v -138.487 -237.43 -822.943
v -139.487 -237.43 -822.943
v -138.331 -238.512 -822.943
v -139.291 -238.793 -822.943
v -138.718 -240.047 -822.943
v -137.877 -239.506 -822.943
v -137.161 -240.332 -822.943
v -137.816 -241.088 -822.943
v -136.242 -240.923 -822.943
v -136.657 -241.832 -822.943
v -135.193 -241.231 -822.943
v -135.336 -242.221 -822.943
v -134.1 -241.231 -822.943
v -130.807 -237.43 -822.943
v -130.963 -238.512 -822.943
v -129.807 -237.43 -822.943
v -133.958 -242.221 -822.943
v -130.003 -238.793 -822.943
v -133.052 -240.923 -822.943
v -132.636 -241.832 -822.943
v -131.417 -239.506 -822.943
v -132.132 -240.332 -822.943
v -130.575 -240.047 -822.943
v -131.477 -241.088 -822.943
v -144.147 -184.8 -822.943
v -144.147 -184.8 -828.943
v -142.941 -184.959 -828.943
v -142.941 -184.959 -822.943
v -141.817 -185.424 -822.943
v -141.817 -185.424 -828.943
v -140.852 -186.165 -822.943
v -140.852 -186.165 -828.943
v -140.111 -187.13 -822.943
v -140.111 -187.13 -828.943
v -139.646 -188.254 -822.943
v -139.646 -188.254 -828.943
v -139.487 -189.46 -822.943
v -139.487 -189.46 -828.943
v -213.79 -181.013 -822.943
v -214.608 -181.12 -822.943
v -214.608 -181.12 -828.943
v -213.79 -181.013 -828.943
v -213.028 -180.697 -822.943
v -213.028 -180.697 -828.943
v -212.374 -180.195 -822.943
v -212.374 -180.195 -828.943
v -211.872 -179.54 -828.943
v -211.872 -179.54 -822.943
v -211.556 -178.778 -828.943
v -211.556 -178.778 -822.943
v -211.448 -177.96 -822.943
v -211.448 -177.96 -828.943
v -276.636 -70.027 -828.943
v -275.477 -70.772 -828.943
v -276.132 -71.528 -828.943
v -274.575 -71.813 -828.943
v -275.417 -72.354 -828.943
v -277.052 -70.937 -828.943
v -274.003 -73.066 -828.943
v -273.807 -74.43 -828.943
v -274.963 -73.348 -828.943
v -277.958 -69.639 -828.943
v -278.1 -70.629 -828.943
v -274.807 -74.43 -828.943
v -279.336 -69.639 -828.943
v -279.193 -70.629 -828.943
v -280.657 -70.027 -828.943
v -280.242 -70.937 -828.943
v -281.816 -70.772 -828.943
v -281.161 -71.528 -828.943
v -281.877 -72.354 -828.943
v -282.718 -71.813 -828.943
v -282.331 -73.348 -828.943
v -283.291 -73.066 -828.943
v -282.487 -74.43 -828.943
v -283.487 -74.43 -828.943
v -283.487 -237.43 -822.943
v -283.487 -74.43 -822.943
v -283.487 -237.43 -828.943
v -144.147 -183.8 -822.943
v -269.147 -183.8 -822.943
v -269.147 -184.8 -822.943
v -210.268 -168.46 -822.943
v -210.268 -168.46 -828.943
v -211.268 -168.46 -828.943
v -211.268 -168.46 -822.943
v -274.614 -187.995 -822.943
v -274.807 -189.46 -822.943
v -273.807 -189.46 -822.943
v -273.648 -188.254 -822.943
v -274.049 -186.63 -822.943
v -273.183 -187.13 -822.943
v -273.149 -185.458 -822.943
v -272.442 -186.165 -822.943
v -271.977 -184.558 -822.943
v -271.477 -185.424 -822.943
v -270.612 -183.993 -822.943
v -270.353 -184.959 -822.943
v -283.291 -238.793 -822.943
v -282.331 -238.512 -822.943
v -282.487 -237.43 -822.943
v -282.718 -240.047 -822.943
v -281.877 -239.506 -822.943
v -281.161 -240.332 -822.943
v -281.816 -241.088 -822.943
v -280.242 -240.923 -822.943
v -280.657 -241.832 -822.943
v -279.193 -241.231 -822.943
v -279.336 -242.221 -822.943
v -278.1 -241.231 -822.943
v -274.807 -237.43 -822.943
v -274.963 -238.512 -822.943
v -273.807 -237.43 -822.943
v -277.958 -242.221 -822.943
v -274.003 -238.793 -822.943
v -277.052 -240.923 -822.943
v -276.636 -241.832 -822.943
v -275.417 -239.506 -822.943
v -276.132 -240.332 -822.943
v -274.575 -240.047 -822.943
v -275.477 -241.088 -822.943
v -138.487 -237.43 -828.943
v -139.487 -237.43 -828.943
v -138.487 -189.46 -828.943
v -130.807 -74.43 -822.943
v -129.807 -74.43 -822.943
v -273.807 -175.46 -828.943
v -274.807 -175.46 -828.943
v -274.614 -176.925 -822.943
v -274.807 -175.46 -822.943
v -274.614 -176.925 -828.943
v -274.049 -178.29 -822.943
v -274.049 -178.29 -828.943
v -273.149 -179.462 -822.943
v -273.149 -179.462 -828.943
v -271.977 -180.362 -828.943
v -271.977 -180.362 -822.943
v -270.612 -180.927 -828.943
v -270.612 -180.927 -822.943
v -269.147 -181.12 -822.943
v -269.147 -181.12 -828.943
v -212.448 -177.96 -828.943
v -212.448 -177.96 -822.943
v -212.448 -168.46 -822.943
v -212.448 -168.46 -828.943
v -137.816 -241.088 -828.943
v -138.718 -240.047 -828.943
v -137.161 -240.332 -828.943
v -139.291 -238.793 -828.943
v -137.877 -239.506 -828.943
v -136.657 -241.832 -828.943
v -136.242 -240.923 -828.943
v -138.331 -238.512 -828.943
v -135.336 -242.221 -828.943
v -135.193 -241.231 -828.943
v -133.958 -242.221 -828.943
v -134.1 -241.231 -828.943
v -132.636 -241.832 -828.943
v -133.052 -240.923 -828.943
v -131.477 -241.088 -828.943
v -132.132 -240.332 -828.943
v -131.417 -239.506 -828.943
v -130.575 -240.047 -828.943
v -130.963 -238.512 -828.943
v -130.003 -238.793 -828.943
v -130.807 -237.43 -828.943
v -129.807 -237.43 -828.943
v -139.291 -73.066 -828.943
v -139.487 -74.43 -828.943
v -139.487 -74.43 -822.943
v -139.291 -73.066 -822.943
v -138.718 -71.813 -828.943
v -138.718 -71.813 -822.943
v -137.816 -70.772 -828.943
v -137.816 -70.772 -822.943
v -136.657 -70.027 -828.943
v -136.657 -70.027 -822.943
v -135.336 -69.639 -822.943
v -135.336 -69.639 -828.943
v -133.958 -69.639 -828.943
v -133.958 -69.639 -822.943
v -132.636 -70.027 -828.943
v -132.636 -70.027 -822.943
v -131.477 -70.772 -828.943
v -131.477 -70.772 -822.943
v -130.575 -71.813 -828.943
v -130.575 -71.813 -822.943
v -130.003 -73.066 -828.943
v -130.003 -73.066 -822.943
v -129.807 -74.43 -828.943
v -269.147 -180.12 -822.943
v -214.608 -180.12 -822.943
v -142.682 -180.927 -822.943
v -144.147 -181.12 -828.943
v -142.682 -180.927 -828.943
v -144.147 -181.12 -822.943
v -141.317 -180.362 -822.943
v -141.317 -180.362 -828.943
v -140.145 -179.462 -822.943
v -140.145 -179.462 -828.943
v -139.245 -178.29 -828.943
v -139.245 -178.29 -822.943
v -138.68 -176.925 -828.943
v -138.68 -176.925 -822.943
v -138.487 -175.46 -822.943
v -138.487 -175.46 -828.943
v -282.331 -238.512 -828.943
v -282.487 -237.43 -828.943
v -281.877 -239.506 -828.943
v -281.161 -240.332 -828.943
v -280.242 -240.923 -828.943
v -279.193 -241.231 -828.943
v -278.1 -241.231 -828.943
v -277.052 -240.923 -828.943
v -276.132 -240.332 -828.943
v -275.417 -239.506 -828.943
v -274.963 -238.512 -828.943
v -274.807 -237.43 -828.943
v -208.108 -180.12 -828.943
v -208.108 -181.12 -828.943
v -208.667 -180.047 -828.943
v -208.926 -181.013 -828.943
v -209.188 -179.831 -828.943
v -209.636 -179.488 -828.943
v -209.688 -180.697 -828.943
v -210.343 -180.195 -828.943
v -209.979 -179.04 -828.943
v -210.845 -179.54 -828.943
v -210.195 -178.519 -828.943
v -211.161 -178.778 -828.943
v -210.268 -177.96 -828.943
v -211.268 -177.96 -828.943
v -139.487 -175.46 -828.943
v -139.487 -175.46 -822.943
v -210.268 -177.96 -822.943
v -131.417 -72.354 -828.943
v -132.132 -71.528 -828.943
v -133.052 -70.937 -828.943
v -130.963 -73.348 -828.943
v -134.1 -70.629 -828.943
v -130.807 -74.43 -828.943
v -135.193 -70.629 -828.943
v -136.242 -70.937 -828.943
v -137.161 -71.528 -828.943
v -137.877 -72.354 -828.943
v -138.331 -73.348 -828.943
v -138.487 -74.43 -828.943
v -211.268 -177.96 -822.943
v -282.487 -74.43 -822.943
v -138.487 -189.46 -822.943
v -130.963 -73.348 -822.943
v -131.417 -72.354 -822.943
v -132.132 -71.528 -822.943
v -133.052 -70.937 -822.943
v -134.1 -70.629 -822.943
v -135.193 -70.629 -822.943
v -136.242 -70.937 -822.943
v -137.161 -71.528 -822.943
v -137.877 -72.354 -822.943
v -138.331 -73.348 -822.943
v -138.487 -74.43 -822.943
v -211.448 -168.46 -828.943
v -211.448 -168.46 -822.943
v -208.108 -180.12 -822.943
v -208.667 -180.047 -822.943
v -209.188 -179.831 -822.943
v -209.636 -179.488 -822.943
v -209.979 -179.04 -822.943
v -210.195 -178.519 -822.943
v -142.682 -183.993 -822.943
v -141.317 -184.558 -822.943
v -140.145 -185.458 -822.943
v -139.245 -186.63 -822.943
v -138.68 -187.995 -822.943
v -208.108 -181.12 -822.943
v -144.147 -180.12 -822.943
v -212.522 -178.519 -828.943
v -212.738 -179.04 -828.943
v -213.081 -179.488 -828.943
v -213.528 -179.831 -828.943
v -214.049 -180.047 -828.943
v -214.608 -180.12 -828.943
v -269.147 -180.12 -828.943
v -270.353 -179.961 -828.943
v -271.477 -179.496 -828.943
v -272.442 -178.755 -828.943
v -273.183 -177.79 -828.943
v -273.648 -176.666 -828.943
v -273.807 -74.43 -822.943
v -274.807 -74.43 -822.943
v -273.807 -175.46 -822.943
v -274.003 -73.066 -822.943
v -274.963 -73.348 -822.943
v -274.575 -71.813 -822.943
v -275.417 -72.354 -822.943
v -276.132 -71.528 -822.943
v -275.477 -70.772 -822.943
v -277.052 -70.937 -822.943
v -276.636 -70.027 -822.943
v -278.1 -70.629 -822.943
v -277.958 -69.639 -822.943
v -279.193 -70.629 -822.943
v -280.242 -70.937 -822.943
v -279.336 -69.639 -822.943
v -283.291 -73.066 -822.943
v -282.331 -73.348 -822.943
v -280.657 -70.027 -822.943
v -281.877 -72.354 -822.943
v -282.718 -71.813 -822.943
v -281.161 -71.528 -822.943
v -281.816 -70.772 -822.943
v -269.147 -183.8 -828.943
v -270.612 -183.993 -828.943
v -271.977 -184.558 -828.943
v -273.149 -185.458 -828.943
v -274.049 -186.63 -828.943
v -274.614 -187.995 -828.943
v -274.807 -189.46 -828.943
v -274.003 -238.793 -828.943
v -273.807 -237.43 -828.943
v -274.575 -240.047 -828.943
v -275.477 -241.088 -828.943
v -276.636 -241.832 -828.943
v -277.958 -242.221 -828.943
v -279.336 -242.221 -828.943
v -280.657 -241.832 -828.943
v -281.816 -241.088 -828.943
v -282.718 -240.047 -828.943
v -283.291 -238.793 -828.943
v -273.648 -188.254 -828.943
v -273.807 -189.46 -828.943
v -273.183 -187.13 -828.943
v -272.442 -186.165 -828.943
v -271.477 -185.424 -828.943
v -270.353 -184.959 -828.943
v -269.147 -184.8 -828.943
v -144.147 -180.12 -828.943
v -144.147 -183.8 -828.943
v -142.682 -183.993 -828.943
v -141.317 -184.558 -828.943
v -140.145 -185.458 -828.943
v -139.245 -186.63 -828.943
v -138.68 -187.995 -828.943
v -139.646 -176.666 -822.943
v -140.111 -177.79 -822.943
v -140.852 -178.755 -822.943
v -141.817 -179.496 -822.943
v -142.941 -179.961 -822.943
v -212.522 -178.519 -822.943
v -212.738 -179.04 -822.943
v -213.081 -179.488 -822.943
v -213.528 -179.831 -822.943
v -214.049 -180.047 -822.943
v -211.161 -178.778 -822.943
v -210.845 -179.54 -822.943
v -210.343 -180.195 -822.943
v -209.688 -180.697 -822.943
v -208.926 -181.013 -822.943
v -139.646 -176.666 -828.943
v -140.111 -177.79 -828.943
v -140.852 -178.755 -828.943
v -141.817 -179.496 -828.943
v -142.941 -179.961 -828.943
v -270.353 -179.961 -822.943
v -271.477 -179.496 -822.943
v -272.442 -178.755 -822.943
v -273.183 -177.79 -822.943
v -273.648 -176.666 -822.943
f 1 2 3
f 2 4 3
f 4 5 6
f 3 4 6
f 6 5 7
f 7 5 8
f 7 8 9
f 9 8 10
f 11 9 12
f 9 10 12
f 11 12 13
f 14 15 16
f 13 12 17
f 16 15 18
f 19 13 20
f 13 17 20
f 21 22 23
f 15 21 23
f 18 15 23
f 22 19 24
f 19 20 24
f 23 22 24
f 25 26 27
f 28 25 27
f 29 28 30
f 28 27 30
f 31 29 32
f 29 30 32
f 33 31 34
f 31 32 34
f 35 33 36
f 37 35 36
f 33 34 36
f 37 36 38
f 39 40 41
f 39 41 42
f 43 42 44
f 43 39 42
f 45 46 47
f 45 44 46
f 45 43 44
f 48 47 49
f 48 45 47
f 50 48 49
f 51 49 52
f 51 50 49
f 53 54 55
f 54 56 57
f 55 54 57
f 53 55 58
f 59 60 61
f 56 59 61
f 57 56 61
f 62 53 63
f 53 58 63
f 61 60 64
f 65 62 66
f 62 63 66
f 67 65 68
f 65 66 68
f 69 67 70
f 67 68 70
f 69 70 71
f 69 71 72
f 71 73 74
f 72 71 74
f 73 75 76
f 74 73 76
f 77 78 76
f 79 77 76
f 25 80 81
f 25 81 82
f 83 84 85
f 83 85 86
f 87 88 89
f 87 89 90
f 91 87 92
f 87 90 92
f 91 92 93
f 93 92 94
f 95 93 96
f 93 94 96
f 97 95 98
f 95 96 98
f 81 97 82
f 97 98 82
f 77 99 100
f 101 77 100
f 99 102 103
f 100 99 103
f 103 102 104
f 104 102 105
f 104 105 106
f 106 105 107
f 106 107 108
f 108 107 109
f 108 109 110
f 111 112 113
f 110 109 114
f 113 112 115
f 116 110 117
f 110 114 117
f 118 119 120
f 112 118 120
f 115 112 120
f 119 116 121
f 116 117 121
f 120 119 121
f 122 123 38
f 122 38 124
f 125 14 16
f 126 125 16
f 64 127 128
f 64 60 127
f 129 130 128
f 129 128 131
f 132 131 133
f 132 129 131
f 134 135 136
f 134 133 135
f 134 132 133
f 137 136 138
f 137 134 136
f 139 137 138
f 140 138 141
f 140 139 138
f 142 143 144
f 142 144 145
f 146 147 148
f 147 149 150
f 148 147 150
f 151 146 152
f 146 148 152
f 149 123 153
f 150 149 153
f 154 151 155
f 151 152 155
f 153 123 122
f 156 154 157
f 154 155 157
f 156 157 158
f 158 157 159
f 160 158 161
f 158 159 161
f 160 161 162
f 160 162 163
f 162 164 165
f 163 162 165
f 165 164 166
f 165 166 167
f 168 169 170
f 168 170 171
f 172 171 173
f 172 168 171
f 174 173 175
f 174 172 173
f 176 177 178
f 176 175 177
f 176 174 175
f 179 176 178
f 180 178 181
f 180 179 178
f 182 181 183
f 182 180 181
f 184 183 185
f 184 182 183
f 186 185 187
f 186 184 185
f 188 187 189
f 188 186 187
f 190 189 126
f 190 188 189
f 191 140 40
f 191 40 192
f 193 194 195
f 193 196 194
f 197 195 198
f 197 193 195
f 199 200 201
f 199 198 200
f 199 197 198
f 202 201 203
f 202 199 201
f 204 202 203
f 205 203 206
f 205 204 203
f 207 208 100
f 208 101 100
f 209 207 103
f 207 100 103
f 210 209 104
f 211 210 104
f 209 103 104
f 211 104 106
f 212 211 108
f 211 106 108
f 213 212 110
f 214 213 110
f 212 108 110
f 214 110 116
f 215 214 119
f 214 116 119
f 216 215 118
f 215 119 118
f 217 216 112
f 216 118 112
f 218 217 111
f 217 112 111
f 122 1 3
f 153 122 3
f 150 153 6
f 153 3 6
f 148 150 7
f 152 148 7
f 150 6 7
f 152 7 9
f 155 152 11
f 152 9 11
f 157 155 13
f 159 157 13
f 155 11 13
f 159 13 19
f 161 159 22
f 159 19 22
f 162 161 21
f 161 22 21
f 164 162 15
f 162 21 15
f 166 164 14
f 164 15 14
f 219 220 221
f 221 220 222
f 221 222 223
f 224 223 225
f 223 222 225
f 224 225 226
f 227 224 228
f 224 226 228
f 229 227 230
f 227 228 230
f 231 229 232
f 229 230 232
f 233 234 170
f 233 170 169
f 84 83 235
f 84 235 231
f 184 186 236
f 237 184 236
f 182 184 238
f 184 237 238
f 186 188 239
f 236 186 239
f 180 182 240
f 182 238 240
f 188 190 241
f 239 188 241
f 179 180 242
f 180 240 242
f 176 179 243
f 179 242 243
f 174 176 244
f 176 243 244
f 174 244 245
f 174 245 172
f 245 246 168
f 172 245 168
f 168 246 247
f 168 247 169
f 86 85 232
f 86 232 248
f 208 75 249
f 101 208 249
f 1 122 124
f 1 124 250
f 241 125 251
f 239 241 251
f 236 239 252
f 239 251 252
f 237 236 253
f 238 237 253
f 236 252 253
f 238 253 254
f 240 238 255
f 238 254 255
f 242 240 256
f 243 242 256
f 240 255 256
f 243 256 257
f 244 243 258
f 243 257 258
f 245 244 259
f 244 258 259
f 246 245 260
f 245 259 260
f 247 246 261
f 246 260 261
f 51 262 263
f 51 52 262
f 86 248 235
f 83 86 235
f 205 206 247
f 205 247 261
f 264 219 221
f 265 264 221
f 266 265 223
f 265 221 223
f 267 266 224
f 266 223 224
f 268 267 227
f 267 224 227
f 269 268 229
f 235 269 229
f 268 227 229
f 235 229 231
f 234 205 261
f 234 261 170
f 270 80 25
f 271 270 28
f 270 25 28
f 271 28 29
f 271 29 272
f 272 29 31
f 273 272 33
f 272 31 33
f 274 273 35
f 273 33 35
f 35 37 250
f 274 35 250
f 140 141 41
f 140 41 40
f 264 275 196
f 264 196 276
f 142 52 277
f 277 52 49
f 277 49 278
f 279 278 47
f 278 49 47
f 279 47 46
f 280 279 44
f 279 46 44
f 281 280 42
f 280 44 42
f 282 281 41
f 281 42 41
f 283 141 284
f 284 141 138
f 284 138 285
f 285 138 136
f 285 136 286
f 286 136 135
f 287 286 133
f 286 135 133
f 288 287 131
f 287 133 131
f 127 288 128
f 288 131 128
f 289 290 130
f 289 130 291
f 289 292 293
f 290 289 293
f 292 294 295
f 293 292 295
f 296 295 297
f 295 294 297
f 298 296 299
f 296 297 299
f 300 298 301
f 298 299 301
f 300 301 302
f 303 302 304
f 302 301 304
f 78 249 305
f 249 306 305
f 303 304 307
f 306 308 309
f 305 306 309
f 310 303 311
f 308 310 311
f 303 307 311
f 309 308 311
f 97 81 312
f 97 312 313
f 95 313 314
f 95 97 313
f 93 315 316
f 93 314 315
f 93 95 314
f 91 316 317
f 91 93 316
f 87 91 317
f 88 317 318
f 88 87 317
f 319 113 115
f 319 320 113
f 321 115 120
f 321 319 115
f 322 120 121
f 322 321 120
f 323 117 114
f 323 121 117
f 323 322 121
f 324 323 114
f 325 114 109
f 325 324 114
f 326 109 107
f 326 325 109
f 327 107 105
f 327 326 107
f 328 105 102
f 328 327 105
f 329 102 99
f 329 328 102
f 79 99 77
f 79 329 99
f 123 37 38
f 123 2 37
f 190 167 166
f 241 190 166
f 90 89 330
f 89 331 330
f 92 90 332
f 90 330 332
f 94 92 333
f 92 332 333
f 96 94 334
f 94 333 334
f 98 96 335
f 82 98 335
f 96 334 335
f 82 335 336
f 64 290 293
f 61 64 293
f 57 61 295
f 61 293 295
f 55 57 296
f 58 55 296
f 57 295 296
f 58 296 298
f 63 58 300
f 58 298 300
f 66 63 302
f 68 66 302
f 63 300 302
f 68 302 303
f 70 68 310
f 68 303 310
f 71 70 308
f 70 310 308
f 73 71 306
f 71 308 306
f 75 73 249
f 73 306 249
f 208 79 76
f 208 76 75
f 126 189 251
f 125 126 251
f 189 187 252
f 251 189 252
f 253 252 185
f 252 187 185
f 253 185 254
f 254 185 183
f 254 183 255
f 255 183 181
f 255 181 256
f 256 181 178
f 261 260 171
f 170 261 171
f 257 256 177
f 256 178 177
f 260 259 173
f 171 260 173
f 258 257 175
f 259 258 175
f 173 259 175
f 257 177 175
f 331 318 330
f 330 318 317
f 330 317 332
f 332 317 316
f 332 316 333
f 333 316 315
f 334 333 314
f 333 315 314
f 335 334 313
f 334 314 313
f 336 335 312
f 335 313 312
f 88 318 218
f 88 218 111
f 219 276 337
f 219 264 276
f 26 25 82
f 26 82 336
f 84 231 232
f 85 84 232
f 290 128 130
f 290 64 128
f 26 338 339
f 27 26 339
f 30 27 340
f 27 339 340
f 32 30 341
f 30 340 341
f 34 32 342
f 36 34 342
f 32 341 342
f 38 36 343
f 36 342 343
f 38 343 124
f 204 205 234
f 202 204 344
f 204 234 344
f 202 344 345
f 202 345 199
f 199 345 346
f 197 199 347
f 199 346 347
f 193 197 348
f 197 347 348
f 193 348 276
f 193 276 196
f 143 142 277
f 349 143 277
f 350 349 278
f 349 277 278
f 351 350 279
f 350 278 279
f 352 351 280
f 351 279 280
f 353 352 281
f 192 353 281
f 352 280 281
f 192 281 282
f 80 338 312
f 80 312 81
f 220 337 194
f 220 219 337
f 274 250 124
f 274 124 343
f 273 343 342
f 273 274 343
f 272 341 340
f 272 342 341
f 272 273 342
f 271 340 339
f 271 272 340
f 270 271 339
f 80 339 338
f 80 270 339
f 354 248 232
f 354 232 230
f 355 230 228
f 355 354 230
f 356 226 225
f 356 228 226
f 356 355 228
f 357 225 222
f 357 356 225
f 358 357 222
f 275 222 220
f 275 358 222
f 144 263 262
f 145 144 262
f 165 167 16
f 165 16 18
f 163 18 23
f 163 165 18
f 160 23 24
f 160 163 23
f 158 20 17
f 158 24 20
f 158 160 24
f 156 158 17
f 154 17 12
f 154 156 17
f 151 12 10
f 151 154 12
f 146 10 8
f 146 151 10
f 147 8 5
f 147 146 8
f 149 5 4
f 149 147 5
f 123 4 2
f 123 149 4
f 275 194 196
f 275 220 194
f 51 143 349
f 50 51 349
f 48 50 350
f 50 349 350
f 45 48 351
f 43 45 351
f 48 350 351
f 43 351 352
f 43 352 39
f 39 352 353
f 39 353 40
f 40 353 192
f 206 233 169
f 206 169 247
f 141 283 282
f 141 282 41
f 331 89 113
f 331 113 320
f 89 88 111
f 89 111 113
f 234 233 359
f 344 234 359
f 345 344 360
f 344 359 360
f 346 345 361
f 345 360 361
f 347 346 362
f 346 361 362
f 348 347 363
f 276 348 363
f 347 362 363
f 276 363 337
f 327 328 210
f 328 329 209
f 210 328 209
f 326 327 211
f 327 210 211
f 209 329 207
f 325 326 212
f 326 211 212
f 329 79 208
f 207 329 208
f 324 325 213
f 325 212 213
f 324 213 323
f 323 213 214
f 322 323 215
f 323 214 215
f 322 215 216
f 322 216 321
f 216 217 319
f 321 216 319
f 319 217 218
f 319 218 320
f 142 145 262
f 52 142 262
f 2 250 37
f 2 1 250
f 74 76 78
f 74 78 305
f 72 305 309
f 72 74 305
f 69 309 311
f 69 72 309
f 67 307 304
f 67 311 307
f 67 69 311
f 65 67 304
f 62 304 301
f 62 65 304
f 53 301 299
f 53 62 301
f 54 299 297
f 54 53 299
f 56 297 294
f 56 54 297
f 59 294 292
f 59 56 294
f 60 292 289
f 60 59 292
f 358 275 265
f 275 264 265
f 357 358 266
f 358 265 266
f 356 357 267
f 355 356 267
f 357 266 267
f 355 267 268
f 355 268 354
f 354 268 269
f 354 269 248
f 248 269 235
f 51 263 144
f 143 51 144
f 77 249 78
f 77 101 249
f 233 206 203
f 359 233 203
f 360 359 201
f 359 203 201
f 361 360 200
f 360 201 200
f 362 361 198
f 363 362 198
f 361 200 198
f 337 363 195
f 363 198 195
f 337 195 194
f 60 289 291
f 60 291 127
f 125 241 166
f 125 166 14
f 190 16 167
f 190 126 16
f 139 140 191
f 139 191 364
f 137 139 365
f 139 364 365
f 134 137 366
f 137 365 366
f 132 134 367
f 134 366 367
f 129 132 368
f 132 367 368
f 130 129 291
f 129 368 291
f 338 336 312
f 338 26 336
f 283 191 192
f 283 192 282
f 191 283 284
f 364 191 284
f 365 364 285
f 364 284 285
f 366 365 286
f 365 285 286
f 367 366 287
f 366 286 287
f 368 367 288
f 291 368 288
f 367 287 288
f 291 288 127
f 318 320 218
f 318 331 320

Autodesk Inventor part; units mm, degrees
ref_plane "YZ Plane" through (0, 0, 0) normal (1, 0, 0) x (0, 1, 0)
ref_plane "Work Plane1" through (-134.6469, -237.4299, -822.9431) normal (0, 0, -1) x (0, -1, 0)
ref_plane "Work Plane3" through (-210.2684, -168.4601, -822.9431) normal (0, 1, 0) x (-1, 0, 0)
sketch "Sketch3" plane through (-210.2684, -168.4601, -822.9431) normal (0, 1, 0) x (-1, 0, 0)
  line L0 (0, 0) -> (1, 0)
  line L1 (1, 0) -> (1, -6)
  line L2 (1, -6) -> (0, -6)
  line L3 (0, -6) -> (0, 0)
  point P0 (-210.2684, 822.9431)
  dimension "d10" = 1
  dimension "d11" = 6
sketch "Sketch1" plane through (-134.6469, -237.4299, -822.9431) normal (0, 0, -1) x (0, -1, 0)
  line L0 (0, 4.84) -> (-47.9698, 4.84)
  line L1 (-52.6298, 9.5) -> (-52.6298, 134.5)
  line L2 (-57.3098, 134.5) -> (-57.3098, 79.9614)
  line L3 (-57.3098, 73.4614) -> (-57.3098, 9.5)
  line L4 (-163, 4.84) -> (-61.9698, 4.84)
  line L5 (-163, -4.84) -> (0, -4.84)
  circle A0 centre (-61.9698, 9.5) radius 4.5 construction
  circle A1 centre (-47.9698, 9.5) radius 4.5 construction
  circle A2 centre (-61.9698, 134.5) radius 4.5
  circle A3 centre (-47.9698, 134.5) radius 4.5
  circle A4 centre (-163, 0) radius 4.5 construction
  circle A5 centre (-163, 144) radius 4.5
  arc A6 (1.9272, 148.2347) -> (2.8669, 147.6644) centre (2.3867, 147.9324) ccw construction
  arc A7 (3.1094, 147.709) -> (2.8669, 147.6644) centre (3.0067, 147.5864) ccw construction
  arc A8 (3.4244, 147.4203) -> (3.1094, 147.709) centre (0, 144) ccw construction
  arc A9 (3.4011, 147.1749) -> (3.4244, 147.4203) centre (3.3112, 147.3073) ccw construction
  arc A10 (3.4011, 147.1749) -> (4.051, 146.2883) centre (3.7099, 146.7197) ccw construction
  arc A11 (4.2921, 146.2368) -> (4.051, 146.2883) centre (4.1503, 146.1628) ccw construction
  arc A12 (4.4727, 145.8495) -> (4.2921, 146.2368) centre (0, 144) ccw construction
  arc A13 (4.3571, 145.6317) -> (4.4727, 145.8495) centre (4.3248, 145.7884) ccw construction
  arc A14 (4.3571, 145.6317) -> (4.6183, 144.5639) centre (4.4683, 145.093) ccw construction
  arc A15 (4.8214, 144.424) -> (4.6183, 144.5639) centre (4.662, 144.41) ccw construction
  arc A16 (4.84, 143.9971) -> (4.8214, 144.424) centre (0, 144) ccw construction
  arc A17 (4.6499, 143.8401) -> (4.84, 143.9971) centre (4.68, 143.9972) ccw construction
  arc A18 (4.6499, 143.8401) -> (4.4826, 142.7536) centre (4.5464, 143.2999) ccw construction
  arc A19 (4.6166, 142.5466) -> (4.4826, 142.7536) centre (4.464, 142.5947) ccw construction
  arc A20 (4.4705, 142.1451) -> (4.6166, 142.5466) centre (0, 144) ccw construction
  arc A21 (4.2347, 142.0728) -> (4.4705, 142.1451) centre (4.3227, 142.2065) ccw construction
  arc A22 (4.2347, 142.0728) -> (3.6644, 141.1331) centre (3.9324, 141.6133) ccw construction
  arc A23 (3.709, 140.8906) -> (3.6644, 141.1331) centre (3.5864, 140.9933) ccw construction
  arc A24 (3.4203, 140.5756) -> (3.709, 140.8906) centre (0, 144) ccw construction
  arc A25 (3.1749, 140.5989) -> (3.4203, 140.5756) centre (3.3073, 140.6888) ccw construction
  arc A26 (3.1749, 140.5989) -> (2.2883, 139.949) centre (2.7197, 140.2901) ccw construction
  arc A27 (2.2368, 139.7079) -> (2.2883, 139.949) centre (2.1628, 139.8497) ccw construction
  arc A28 (1.8495, 139.5273) -> (2.2368, 139.7079) centre (0, 144) ccw construction
  arc A29 (1.6317, 139.6429) -> (1.8495, 139.5273) centre (1.7884, 139.6752) ccw construction
  arc A30 (1.6317, 139.6429) -> (0.5639, 139.3817) centre (1.093, 139.5317) ccw construction
  arc A31 (0.424, 139.1786) -> (0.5639, 139.3817) centre (0.41, 139.338) ccw construction
  arc A32 (-0.0029, 139.16) -> (0.424, 139.1786) centre (0, 144) ccw construction
  arc A33 (-0.1599, 139.3501) -> (-0.0029, 139.16) centre (-0.0028, 139.32) ccw construction
  arc A34 (-0.1599, 139.3501) -> (-1.2464, 139.5174) centre (-0.7001, 139.4536) ccw construction
  arc A35 (-1.4534, 139.3834) -> (-1.2464, 139.5174) centre (-1.4053, 139.536) ccw construction
  arc A36 (-1.8549, 139.5295) -> (-1.4534, 139.3834) centre (0, 144) ccw construction
  arc A37 (-1.9272, 139.7653) -> (-1.8549, 139.5295) centre (-1.7935, 139.6773) ccw construction
  arc A38 (-1.9272, 139.7653) -> (-2.8669, 140.3356) centre (-2.3867, 140.0676) ccw construction
  arc A39 (-3.1094, 140.291) -> (-2.8669, 140.3356) centre (-3.0067, 140.4136) ccw construction
  arc A40 (-3.4244, 140.5797) -> (-3.1094, 140.291) centre (0, 144) ccw construction
  arc A41 (-3.4011, 140.8251) -> (-3.4244, 140.5797) centre (-3.3112, 140.6927) ccw construction
  arc A42 (-3.4011, 140.8251) -> (-4.051, 141.7117) centre (-3.7099, 141.2803) ccw construction
  arc A43 (-4.2921, 141.7632) -> (-4.051, 141.7117) centre (-4.1503, 141.8372) ccw construction
  arc A44 (-4.4727, 142.1505) -> (-4.2921, 141.7632) centre (0, 144) ccw construction
  arc A45 (-4.3571, 142.3683) -> (-4.4727, 142.1505) centre (-4.3248, 142.2116) ccw construction
  arc A46 (-4.3571, 142.3683) -> (-4.6183, 143.4361) centre (-4.4683, 142.907) ccw construction
  arc A47 (-4.8214, 143.576) -> (-4.6183, 143.4361) centre (-4.662, 143.59) ccw construction
  arc A48 (-4.84, 144.0029) -> (-4.8214, 143.576) centre (0, 144) ccw construction
  arc A49 (-4.6499, 144.1599) -> (-4.84, 144.0029) centre (-4.68, 144.0028) ccw construction
  arc A50 (-4.6499, 144.1599) -> (-4.4826, 145.2464) centre (-4.5464, 144.7001) ccw construction
  arc A51 (-4.6166, 145.4534) -> (-4.4826, 145.2464) centre (-4.464, 145.4053) ccw construction
  arc A52 (-4.4705, 145.8549) -> (-4.6166, 145.4534) centre (0, 144) ccw construction
  arc A53 (-4.2347, 145.9272) -> (-4.4705, 145.8549) centre (-4.3227, 145.7935) ccw construction
  arc A54 (-4.2347, 145.9272) -> (-3.6644, 146.8669) centre (-3.9324, 146.3867) ccw construction
  arc A55 (-3.709, 147.1094) -> (-3.6644, 146.8669) centre (-3.5864, 147.0067) ccw construction
  arc A56 (-3.4203, 147.4244) -> (-3.709, 147.1094) centre (0, 144) ccw construction
  arc A57 (-3.1749, 147.4011) -> (-3.4203, 147.4244) centre (-3.3073, 147.3112) ccw construction
  arc A58 (-3.1749, 147.4011) -> (-2.2883, 148.051) centre (-2.7197, 147.7099) ccw construction
  arc A59 (-2.2368, 148.2921) -> (-2.2883, 148.051) centre (-2.1628, 148.1503) ccw construction
  arc A60 (-1.8495, 148.4727) -> (-2.2368, 148.2921) centre (0, 144) ccw construction
  arc A61 (-1.6317, 148.3571) -> (-1.8495, 148.4727) centre (-1.7884, 148.3248) ccw construction
  arc A62 (-1.6317, 148.3571) -> (-0.5639, 148.6183) centre (-1.093, 148.4683) ccw construction
  arc A63 (-0.424, 148.8214) -> (-0.5639, 148.6183) centre (-0.41, 148.662) ccw construction
  arc A64 (0.0029, 148.84) -> (-0.424, 148.8214) centre (0, 144) ccw construction
  arc A65 (0.1599, 148.6499) -> (0.0029, 148.84) centre (0.0028, 148.68) ccw construction
  arc A66 (0.1599, 148.6499) -> (1.2464, 148.4826) centre (0.7001, 148.5464) ccw construction
  arc A67 (1.4534, 148.6166) -> (1.2464, 148.4826) centre (1.4053, 148.464) ccw construction
  arc A68 (1.8549, 148.4705) -> (1.4534, 148.6166) centre (0, 144) ccw construction
  arc A69 (1.9272, 148.2347) -> (1.8549, 148.4705) centre (1.7935, 148.3227) ccw construction
  arc A70 (3.6555, -2.8782) -> (2.8782, -3.6555) centre (3.2527, -3.2527) ccw construction
  arc A71 (2.864, -3.9017) -> (2.8782, -3.6555) centre (2.7693, -3.7727) ccw construction
  arc A72 (2.5087, -4.1391) -> (2.864, -3.9017) centre (0, 0) ccw construction
  arc A73 (2.2758, -4.058) -> (2.5087, -4.1391) centre (2.4258, -4.0023) ccw construction
  arc A74 (2.2758, -4.058) -> (1.2602, -4.4787) centre (1.7603, -4.2498) ccw construction
  arc A75 (1.1528, -4.7007) -> (1.2602, -4.4787) centre (1.1147, -4.5453) ccw construction
  arc A76 (0.7338, -4.7841) -> (1.1528, -4.7007) centre (0, 0) ccw construction
  arc A77 (0.5496, -4.6201) -> (0.7338, -4.7841) centre (0.7095, -4.6259) ccw construction
  arc A78 (0.5496, -4.6201) -> (-0.5496, -4.6201) centre (0, -4.6) ccw construction
  arc A79 (-0.7338, -4.7841) -> (-0.5496, -4.6201) centre (-0.7095, -4.6259) ccw construction
  arc A80 (-1.1528, -4.7007) -> (-0.7338, -4.7841) centre (0, 0) ccw construction
  arc A81 (-1.2602, -4.4787) -> (-1.1528, -4.7007) centre (-1.1147, -4.5453) ccw construction
  arc A82 (-1.2602, -4.4787) -> (-2.2758, -4.058) centre (-1.7603, -4.2498) ccw construction
  arc A83 (-2.5087, -4.1391) -> (-2.2758, -4.058) centre (-2.4258, -4.0023) ccw construction
  arc A84 (-2.864, -3.9017) -> (-2.5087, -4.1391) centre (0, 0) ccw construction
  arc A85 (-2.8782, -3.6555) -> (-2.864, -3.9017) centre (-2.7693, -3.7727) ccw construction
  arc A86 (-2.8782, -3.6555) -> (-3.6555, -2.8782) centre (-3.2527, -3.2527) ccw construction
  arc A87 (-3.9017, -2.864) -> (-3.6555, -2.8782) centre (-3.7727, -2.7693) ccw construction
  arc A88 (-4.1391, -2.5087) -> (-3.9017, -2.864) centre (0, 0) ccw construction
  arc A89 (-4.058, -2.2758) -> (-4.1391, -2.5087) centre (-4.0023, -2.4258) ccw construction
  arc A90 (-4.058, -2.2758) -> (-4.4787, -1.2602) centre (-4.2498, -1.7603) ccw construction
  arc A91 (-4.7007, -1.1528) -> (-4.4787, -1.2602) centre (-4.5453, -1.1147) ccw construction
  arc A92 (-4.7841, -0.7338) -> (-4.7007, -1.1528) centre (0, 0) ccw construction
  arc A93 (-4.6201, -0.5496) -> (-4.7841, -0.7338) centre (-4.6259, -0.7095) ccw construction
  arc A94 (-4.6201, -0.5496) -> (-4.6201, 0.5496) centre (-4.6, 0) ccw construction
  arc A95 (-4.7841, 0.7338) -> (-4.6201, 0.5496) centre (-4.6259, 0.7095) ccw construction
  arc A96 (-4.7007, 1.1528) -> (-4.7841, 0.7338) centre (0, 0) ccw construction
  arc A97 (-4.4787, 1.2602) -> (-4.7007, 1.1528) centre (-4.5453, 1.1147) ccw construction
  arc A98 (-4.4787, 1.2602) -> (-4.058, 2.2758) centre (-4.2498, 1.7603) ccw construction
  arc A99 (-4.1391, 2.5087) -> (-4.058, 2.2758) centre (-4.0023, 2.4258) ccw construction
  arc A100 (-3.9017, 2.864) -> (-4.1391, 2.5087) centre (0, 0) ccw construction
  arc A101 (-3.6555, 2.8782) -> (-3.9017, 2.864) centre (-3.7727, 2.7693) ccw construction
  arc A102 (-3.6555, 2.8782) -> (-2.8782, 3.6555) centre (-3.2527, 3.2527) ccw construction
  arc A103 (-2.864, 3.9017) -> (-2.8782, 3.6555) centre (-2.7693, 3.7727) ccw construction
  arc A104 (-2.5087, 4.1391) -> (-2.864, 3.9017) centre (0, 0) ccw construction
  arc A105 (-2.2758, 4.058) -> (-2.5087, 4.1391) centre (-2.4258, 4.0023) ccw construction
  arc A106 (-2.2758, 4.058) -> (-1.2602, 4.4787) centre (-1.7603, 4.2498) ccw construction
  arc A107 (-1.1528, 4.7007) -> (-1.2602, 4.4787) centre (-1.1147, 4.5453) ccw construction
  arc A108 (-0.7338, 4.7841) -> (-1.1528, 4.7007) centre (0, 0) ccw construction
  arc A109 (-0.5496, 4.6201) -> (-0.7338, 4.7841) centre (-0.7095, 4.6259) ccw construction
  arc A110 (-0.5496, 4.6201) -> (0.5496, 4.6201) centre (0, 4.6) ccw construction
  arc A111 (0.7338, 4.7841) -> (0.5496, 4.6201) centre (0.7095, 4.6259) ccw construction
  arc A112 (1.1528, 4.7007) -> (0.7338, 4.7841) centre (0, 0) ccw construction
  arc A113 (1.2602, 4.4787) -> (1.1528, 4.7007) centre (1.1147, 4.5453) ccw construction
  arc A114 (1.2602, 4.4787) -> (2.2758, 4.058) centre (1.7603, 4.2498) ccw construction
  arc A115 (2.5087, 4.1391) -> (2.2758, 4.058) centre (2.4258, 4.0023) ccw construction
  arc A116 (2.864, 3.9017) -> (2.5087, 4.1391) centre (0, 0) ccw construction
  arc A117 (2.8782, 3.6555) -> (2.864, 3.9017) centre (2.7693, 3.7727) ccw construction
  arc A118 (2.8782, 3.6555) -> (3.6555, 2.8782) centre (3.2527, 3.2527) ccw construction
  arc A119 (3.9017, 2.864) -> (3.6555, 2.8782) centre (3.7727, 2.7693) ccw construction
  arc A120 (4.1391, 2.5087) -> (3.9017, 2.864) centre (0, 0) ccw construction
  arc A121 (4.058, 2.2758) -> (4.1391, 2.5087) centre (4.0023, 2.4258) ccw construction
  arc A122 (4.058, 2.2758) -> (4.4787, 1.2602) centre (4.2498, 1.7603) ccw construction
  arc A123 (4.7007, 1.1528) -> (4.4787, 1.2602) centre (4.5453, 1.1147) ccw construction
  arc A124 (4.7841, 0.7338) -> (4.7007, 1.1528) centre (0, 0) ccw construction
  arc A125 (4.6201, 0.5496) -> (4.7841, 0.7338) centre (4.6259, 0.7095) ccw construction
  arc A126 (4.6201, 0.5496) -> (4.6201, -0.5496) centre (4.6, 0) ccw construction
  arc A127 (4.7841, -0.7338) -> (4.6201, -0.5496) centre (4.6259, -0.7095) ccw construction
  arc A128 (4.7007, -1.1528) -> (4.7841, -0.7338) centre (0, 0) ccw construction
  arc A129 (4.4787, -1.2602) -> (4.7007, -1.1528) centre (4.5453, -1.1147) ccw construction
  arc A130 (4.4787, -1.2602) -> (4.058, -2.2758) centre (4.2498, -1.7603) ccw construction
  arc A131 (4.1391, -2.5087) -> (4.058, -2.2758) centre (4.0023, -2.4258) ccw construction
  arc A132 (3.9017, -2.864) -> (4.1391, -2.5087) centre (0, 0) ccw construction
  arc A133 (3.6555, -2.8782) -> (3.9017, -2.864) centre (3.7727, -2.7693) ccw construction
  arc A134 (-47.9698, 139.16) -> (-52.6298, 134.5) centre (-47.9698, 134.5) ccw
  arc A135 (-57.3098, 134.5) -> (-61.9698, 139.16) centre (-61.9698, 134.5) ccw
  arc A136 (-163, 148.84) -> (-163, 139.16) centre (-163, 144) ccw
  line L6 (-163, 139.16) -> (-61.9698, 139.16)
  arc A137 (-52.6298, 9.5) -> (-47.9698, 4.84) centre (-47.9698, 9.5) ccw
  arc A138 (-61.9698, 4.84) -> (-57.3098, 9.5) centre (-61.9698, 9.5) ccw
  arc A139 (-163, 4.84) -> (-163, -4.84) centre (-163, 0) ccw
  line L7 (-57.4698, 82.7114) -> (-51.4698, 82.7114) construction
  line L8 (-57.4698, 79.9614) -> (-57.4698, 82.7114) construction
  arc A140 (-59.4698, 77.9614) -> (-57.4698, 79.9614) centre (-59.4698, 79.9614) ccw construction
  line L9 (-68.9698, 77.9614) -> (-59.4698, 77.9614) construction
  line L10 (-68.9698, 75.4614) -> (-68.9698, 77.9614) construction
  line L11 (-59.4698, 75.4614) -> (-68.9698, 75.4614) construction
  arc A141 (-57.4698, 73.4614) -> (-59.4698, 75.4614) centre (-59.4698, 73.4614) ccw construction
  line L12 (-57.4698, 70.7114) -> (-57.4698, 73.4614) construction
  line L13 (-51.4698, 70.7114) -> (-57.4698, 70.7114) construction
  line L14 (-51.4698, 82.7114) -> (-51.4698, 70.7114) construction
  arc A142 (-57.3098, 73.4614) -> (-59.4698, 75.6214) centre (-59.4698, 73.4614) ccw
  arc A143 (-59.4698, 77.8014) -> (-57.3098, 79.9614) centre (-59.4698, 79.9614) ccw
  line L15 (-59.4698, 75.6214) -> (-68.9698, 75.6214)
  line L16 (-59.4698, 77.8014) -> (-68.9698, 77.8014)
  line L17 (-47.9698, 139.16) -> (0, 139.16)
  line L18 (0, 148.84) -> (-163, 148.84)
  arc A144 (0, 139.16) -> (0, 148.84) centre (0, 144) ccw
  arc A145 (0, -4.84) -> (0, 4.84) centre (0, 0) ccw
  point P0 (-237.4299, -134.6469)
sweep "Sweep3" add profiles "Sketch3" path "Sketch1" path curves L15 A142 L3 A138 L4 A139 L5 A145 L0 A137 L1 A134 L17 A144 L18 A136 L6 A135 L2 A143 L16
properties part number "GT2 Belt"
